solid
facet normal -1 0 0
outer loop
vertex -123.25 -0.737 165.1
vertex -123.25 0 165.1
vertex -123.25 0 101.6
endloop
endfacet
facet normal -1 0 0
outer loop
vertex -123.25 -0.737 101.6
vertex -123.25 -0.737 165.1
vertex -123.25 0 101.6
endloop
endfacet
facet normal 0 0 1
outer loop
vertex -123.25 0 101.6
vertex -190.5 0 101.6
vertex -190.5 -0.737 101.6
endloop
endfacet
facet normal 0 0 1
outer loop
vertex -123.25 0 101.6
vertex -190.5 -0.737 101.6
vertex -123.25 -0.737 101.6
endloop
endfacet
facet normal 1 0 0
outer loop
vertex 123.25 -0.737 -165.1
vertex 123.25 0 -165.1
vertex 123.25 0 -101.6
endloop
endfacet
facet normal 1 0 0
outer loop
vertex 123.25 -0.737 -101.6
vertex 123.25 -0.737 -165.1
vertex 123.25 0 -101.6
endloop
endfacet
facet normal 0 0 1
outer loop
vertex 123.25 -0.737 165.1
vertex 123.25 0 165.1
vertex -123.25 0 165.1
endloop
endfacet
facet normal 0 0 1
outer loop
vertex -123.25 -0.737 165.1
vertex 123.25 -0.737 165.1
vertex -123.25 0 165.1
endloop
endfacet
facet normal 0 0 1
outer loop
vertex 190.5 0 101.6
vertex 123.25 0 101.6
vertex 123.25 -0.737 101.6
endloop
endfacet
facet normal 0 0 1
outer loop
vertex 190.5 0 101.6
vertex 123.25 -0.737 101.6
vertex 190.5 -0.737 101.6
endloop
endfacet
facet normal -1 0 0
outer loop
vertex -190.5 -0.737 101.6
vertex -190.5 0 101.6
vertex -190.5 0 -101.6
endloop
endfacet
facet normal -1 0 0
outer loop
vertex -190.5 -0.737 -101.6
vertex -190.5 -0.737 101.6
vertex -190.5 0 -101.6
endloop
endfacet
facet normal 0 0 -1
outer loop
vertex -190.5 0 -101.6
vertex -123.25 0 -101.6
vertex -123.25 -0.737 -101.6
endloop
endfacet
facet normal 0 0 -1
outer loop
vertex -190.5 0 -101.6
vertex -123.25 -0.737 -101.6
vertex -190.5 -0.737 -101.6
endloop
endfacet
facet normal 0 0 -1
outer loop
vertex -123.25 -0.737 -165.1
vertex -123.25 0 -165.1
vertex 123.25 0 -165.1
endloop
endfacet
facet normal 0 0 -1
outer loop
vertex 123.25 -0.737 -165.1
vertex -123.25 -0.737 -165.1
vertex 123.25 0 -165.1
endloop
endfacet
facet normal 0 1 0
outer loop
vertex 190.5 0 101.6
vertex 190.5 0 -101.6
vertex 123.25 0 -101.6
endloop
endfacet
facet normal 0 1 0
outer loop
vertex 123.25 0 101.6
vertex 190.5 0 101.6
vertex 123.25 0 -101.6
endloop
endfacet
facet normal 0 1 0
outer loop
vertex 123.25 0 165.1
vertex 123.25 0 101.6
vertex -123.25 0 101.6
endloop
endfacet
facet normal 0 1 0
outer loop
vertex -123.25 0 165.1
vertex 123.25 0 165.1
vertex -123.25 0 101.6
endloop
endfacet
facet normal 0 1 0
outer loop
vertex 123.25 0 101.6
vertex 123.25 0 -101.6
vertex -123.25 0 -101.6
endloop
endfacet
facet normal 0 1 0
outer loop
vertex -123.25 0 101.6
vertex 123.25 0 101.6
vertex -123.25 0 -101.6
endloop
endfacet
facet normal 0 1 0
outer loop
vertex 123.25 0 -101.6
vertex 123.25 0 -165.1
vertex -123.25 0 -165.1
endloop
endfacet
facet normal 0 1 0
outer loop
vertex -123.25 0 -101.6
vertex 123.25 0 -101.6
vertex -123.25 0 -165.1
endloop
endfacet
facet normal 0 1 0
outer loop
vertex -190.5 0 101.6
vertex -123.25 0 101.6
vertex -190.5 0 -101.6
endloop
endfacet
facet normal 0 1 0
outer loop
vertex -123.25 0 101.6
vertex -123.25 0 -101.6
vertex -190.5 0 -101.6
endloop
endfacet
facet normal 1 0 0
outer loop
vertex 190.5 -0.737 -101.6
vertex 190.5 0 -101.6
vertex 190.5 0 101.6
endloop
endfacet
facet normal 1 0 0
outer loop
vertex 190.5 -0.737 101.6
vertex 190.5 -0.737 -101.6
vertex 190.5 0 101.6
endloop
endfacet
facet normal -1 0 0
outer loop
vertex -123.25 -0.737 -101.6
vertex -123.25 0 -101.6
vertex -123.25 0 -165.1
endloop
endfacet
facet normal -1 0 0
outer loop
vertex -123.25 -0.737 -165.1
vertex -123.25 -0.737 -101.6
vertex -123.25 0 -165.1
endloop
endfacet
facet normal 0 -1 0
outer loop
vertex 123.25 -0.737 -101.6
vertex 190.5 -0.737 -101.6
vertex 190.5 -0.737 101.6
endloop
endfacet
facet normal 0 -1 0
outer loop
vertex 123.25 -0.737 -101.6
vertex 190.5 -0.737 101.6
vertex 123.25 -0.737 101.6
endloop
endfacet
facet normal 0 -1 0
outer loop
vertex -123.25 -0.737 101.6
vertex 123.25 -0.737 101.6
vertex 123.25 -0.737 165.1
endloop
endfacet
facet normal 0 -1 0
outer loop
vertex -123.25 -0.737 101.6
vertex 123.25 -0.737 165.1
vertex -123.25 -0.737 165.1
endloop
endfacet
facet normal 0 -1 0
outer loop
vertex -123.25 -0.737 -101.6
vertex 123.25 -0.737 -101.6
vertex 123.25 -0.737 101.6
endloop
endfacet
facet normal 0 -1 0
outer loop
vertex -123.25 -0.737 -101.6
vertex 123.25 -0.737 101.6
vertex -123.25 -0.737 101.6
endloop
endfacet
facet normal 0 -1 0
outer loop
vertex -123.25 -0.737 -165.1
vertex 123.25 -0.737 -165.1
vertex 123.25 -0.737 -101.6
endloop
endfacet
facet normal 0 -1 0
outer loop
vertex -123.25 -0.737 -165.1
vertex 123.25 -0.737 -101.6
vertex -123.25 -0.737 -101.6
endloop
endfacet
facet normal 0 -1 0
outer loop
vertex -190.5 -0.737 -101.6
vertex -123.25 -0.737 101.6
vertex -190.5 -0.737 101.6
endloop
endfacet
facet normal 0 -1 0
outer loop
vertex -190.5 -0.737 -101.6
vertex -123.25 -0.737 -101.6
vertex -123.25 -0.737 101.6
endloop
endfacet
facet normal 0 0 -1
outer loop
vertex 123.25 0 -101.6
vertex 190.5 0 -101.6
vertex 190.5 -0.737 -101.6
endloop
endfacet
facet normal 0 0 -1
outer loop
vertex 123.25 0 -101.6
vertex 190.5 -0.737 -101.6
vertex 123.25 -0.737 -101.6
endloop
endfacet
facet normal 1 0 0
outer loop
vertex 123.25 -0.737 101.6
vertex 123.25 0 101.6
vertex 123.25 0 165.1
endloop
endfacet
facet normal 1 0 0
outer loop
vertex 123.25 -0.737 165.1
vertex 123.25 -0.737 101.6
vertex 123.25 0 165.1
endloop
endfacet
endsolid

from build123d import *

# Parameters (mm, degrees)
BASE_FLANGE1_DEPTH = 0.7366


# Sheet-metal steps are written as plain solids
with BuildPart() as part:
    # Sketch1 → Base-Flange1 (new body)
    with BuildSketch(Plane(origin=(0, 0, 0), x_dir=(1, 0, 0), z_dir=(0, 1, 0))):
        Polygon((-127, 101.6), (-123.25, 101.6), (-123.25, 165.1), (123.25, 165.1), (123.25, 101.6), (127, 101.6), (190.5, 101.6), (190.5, -101.6), (127, -101.6), (123.25, -101.6), (123.25, -165.1), (-123.25, -165.1), (-123.25, -101.6), (-127, -101.6), (-190.5, -101.6), (-190.5, 101.6), align=None)
    extrude(amount=-BASE_FLANGE1_DEPTH)


solid = part.part
